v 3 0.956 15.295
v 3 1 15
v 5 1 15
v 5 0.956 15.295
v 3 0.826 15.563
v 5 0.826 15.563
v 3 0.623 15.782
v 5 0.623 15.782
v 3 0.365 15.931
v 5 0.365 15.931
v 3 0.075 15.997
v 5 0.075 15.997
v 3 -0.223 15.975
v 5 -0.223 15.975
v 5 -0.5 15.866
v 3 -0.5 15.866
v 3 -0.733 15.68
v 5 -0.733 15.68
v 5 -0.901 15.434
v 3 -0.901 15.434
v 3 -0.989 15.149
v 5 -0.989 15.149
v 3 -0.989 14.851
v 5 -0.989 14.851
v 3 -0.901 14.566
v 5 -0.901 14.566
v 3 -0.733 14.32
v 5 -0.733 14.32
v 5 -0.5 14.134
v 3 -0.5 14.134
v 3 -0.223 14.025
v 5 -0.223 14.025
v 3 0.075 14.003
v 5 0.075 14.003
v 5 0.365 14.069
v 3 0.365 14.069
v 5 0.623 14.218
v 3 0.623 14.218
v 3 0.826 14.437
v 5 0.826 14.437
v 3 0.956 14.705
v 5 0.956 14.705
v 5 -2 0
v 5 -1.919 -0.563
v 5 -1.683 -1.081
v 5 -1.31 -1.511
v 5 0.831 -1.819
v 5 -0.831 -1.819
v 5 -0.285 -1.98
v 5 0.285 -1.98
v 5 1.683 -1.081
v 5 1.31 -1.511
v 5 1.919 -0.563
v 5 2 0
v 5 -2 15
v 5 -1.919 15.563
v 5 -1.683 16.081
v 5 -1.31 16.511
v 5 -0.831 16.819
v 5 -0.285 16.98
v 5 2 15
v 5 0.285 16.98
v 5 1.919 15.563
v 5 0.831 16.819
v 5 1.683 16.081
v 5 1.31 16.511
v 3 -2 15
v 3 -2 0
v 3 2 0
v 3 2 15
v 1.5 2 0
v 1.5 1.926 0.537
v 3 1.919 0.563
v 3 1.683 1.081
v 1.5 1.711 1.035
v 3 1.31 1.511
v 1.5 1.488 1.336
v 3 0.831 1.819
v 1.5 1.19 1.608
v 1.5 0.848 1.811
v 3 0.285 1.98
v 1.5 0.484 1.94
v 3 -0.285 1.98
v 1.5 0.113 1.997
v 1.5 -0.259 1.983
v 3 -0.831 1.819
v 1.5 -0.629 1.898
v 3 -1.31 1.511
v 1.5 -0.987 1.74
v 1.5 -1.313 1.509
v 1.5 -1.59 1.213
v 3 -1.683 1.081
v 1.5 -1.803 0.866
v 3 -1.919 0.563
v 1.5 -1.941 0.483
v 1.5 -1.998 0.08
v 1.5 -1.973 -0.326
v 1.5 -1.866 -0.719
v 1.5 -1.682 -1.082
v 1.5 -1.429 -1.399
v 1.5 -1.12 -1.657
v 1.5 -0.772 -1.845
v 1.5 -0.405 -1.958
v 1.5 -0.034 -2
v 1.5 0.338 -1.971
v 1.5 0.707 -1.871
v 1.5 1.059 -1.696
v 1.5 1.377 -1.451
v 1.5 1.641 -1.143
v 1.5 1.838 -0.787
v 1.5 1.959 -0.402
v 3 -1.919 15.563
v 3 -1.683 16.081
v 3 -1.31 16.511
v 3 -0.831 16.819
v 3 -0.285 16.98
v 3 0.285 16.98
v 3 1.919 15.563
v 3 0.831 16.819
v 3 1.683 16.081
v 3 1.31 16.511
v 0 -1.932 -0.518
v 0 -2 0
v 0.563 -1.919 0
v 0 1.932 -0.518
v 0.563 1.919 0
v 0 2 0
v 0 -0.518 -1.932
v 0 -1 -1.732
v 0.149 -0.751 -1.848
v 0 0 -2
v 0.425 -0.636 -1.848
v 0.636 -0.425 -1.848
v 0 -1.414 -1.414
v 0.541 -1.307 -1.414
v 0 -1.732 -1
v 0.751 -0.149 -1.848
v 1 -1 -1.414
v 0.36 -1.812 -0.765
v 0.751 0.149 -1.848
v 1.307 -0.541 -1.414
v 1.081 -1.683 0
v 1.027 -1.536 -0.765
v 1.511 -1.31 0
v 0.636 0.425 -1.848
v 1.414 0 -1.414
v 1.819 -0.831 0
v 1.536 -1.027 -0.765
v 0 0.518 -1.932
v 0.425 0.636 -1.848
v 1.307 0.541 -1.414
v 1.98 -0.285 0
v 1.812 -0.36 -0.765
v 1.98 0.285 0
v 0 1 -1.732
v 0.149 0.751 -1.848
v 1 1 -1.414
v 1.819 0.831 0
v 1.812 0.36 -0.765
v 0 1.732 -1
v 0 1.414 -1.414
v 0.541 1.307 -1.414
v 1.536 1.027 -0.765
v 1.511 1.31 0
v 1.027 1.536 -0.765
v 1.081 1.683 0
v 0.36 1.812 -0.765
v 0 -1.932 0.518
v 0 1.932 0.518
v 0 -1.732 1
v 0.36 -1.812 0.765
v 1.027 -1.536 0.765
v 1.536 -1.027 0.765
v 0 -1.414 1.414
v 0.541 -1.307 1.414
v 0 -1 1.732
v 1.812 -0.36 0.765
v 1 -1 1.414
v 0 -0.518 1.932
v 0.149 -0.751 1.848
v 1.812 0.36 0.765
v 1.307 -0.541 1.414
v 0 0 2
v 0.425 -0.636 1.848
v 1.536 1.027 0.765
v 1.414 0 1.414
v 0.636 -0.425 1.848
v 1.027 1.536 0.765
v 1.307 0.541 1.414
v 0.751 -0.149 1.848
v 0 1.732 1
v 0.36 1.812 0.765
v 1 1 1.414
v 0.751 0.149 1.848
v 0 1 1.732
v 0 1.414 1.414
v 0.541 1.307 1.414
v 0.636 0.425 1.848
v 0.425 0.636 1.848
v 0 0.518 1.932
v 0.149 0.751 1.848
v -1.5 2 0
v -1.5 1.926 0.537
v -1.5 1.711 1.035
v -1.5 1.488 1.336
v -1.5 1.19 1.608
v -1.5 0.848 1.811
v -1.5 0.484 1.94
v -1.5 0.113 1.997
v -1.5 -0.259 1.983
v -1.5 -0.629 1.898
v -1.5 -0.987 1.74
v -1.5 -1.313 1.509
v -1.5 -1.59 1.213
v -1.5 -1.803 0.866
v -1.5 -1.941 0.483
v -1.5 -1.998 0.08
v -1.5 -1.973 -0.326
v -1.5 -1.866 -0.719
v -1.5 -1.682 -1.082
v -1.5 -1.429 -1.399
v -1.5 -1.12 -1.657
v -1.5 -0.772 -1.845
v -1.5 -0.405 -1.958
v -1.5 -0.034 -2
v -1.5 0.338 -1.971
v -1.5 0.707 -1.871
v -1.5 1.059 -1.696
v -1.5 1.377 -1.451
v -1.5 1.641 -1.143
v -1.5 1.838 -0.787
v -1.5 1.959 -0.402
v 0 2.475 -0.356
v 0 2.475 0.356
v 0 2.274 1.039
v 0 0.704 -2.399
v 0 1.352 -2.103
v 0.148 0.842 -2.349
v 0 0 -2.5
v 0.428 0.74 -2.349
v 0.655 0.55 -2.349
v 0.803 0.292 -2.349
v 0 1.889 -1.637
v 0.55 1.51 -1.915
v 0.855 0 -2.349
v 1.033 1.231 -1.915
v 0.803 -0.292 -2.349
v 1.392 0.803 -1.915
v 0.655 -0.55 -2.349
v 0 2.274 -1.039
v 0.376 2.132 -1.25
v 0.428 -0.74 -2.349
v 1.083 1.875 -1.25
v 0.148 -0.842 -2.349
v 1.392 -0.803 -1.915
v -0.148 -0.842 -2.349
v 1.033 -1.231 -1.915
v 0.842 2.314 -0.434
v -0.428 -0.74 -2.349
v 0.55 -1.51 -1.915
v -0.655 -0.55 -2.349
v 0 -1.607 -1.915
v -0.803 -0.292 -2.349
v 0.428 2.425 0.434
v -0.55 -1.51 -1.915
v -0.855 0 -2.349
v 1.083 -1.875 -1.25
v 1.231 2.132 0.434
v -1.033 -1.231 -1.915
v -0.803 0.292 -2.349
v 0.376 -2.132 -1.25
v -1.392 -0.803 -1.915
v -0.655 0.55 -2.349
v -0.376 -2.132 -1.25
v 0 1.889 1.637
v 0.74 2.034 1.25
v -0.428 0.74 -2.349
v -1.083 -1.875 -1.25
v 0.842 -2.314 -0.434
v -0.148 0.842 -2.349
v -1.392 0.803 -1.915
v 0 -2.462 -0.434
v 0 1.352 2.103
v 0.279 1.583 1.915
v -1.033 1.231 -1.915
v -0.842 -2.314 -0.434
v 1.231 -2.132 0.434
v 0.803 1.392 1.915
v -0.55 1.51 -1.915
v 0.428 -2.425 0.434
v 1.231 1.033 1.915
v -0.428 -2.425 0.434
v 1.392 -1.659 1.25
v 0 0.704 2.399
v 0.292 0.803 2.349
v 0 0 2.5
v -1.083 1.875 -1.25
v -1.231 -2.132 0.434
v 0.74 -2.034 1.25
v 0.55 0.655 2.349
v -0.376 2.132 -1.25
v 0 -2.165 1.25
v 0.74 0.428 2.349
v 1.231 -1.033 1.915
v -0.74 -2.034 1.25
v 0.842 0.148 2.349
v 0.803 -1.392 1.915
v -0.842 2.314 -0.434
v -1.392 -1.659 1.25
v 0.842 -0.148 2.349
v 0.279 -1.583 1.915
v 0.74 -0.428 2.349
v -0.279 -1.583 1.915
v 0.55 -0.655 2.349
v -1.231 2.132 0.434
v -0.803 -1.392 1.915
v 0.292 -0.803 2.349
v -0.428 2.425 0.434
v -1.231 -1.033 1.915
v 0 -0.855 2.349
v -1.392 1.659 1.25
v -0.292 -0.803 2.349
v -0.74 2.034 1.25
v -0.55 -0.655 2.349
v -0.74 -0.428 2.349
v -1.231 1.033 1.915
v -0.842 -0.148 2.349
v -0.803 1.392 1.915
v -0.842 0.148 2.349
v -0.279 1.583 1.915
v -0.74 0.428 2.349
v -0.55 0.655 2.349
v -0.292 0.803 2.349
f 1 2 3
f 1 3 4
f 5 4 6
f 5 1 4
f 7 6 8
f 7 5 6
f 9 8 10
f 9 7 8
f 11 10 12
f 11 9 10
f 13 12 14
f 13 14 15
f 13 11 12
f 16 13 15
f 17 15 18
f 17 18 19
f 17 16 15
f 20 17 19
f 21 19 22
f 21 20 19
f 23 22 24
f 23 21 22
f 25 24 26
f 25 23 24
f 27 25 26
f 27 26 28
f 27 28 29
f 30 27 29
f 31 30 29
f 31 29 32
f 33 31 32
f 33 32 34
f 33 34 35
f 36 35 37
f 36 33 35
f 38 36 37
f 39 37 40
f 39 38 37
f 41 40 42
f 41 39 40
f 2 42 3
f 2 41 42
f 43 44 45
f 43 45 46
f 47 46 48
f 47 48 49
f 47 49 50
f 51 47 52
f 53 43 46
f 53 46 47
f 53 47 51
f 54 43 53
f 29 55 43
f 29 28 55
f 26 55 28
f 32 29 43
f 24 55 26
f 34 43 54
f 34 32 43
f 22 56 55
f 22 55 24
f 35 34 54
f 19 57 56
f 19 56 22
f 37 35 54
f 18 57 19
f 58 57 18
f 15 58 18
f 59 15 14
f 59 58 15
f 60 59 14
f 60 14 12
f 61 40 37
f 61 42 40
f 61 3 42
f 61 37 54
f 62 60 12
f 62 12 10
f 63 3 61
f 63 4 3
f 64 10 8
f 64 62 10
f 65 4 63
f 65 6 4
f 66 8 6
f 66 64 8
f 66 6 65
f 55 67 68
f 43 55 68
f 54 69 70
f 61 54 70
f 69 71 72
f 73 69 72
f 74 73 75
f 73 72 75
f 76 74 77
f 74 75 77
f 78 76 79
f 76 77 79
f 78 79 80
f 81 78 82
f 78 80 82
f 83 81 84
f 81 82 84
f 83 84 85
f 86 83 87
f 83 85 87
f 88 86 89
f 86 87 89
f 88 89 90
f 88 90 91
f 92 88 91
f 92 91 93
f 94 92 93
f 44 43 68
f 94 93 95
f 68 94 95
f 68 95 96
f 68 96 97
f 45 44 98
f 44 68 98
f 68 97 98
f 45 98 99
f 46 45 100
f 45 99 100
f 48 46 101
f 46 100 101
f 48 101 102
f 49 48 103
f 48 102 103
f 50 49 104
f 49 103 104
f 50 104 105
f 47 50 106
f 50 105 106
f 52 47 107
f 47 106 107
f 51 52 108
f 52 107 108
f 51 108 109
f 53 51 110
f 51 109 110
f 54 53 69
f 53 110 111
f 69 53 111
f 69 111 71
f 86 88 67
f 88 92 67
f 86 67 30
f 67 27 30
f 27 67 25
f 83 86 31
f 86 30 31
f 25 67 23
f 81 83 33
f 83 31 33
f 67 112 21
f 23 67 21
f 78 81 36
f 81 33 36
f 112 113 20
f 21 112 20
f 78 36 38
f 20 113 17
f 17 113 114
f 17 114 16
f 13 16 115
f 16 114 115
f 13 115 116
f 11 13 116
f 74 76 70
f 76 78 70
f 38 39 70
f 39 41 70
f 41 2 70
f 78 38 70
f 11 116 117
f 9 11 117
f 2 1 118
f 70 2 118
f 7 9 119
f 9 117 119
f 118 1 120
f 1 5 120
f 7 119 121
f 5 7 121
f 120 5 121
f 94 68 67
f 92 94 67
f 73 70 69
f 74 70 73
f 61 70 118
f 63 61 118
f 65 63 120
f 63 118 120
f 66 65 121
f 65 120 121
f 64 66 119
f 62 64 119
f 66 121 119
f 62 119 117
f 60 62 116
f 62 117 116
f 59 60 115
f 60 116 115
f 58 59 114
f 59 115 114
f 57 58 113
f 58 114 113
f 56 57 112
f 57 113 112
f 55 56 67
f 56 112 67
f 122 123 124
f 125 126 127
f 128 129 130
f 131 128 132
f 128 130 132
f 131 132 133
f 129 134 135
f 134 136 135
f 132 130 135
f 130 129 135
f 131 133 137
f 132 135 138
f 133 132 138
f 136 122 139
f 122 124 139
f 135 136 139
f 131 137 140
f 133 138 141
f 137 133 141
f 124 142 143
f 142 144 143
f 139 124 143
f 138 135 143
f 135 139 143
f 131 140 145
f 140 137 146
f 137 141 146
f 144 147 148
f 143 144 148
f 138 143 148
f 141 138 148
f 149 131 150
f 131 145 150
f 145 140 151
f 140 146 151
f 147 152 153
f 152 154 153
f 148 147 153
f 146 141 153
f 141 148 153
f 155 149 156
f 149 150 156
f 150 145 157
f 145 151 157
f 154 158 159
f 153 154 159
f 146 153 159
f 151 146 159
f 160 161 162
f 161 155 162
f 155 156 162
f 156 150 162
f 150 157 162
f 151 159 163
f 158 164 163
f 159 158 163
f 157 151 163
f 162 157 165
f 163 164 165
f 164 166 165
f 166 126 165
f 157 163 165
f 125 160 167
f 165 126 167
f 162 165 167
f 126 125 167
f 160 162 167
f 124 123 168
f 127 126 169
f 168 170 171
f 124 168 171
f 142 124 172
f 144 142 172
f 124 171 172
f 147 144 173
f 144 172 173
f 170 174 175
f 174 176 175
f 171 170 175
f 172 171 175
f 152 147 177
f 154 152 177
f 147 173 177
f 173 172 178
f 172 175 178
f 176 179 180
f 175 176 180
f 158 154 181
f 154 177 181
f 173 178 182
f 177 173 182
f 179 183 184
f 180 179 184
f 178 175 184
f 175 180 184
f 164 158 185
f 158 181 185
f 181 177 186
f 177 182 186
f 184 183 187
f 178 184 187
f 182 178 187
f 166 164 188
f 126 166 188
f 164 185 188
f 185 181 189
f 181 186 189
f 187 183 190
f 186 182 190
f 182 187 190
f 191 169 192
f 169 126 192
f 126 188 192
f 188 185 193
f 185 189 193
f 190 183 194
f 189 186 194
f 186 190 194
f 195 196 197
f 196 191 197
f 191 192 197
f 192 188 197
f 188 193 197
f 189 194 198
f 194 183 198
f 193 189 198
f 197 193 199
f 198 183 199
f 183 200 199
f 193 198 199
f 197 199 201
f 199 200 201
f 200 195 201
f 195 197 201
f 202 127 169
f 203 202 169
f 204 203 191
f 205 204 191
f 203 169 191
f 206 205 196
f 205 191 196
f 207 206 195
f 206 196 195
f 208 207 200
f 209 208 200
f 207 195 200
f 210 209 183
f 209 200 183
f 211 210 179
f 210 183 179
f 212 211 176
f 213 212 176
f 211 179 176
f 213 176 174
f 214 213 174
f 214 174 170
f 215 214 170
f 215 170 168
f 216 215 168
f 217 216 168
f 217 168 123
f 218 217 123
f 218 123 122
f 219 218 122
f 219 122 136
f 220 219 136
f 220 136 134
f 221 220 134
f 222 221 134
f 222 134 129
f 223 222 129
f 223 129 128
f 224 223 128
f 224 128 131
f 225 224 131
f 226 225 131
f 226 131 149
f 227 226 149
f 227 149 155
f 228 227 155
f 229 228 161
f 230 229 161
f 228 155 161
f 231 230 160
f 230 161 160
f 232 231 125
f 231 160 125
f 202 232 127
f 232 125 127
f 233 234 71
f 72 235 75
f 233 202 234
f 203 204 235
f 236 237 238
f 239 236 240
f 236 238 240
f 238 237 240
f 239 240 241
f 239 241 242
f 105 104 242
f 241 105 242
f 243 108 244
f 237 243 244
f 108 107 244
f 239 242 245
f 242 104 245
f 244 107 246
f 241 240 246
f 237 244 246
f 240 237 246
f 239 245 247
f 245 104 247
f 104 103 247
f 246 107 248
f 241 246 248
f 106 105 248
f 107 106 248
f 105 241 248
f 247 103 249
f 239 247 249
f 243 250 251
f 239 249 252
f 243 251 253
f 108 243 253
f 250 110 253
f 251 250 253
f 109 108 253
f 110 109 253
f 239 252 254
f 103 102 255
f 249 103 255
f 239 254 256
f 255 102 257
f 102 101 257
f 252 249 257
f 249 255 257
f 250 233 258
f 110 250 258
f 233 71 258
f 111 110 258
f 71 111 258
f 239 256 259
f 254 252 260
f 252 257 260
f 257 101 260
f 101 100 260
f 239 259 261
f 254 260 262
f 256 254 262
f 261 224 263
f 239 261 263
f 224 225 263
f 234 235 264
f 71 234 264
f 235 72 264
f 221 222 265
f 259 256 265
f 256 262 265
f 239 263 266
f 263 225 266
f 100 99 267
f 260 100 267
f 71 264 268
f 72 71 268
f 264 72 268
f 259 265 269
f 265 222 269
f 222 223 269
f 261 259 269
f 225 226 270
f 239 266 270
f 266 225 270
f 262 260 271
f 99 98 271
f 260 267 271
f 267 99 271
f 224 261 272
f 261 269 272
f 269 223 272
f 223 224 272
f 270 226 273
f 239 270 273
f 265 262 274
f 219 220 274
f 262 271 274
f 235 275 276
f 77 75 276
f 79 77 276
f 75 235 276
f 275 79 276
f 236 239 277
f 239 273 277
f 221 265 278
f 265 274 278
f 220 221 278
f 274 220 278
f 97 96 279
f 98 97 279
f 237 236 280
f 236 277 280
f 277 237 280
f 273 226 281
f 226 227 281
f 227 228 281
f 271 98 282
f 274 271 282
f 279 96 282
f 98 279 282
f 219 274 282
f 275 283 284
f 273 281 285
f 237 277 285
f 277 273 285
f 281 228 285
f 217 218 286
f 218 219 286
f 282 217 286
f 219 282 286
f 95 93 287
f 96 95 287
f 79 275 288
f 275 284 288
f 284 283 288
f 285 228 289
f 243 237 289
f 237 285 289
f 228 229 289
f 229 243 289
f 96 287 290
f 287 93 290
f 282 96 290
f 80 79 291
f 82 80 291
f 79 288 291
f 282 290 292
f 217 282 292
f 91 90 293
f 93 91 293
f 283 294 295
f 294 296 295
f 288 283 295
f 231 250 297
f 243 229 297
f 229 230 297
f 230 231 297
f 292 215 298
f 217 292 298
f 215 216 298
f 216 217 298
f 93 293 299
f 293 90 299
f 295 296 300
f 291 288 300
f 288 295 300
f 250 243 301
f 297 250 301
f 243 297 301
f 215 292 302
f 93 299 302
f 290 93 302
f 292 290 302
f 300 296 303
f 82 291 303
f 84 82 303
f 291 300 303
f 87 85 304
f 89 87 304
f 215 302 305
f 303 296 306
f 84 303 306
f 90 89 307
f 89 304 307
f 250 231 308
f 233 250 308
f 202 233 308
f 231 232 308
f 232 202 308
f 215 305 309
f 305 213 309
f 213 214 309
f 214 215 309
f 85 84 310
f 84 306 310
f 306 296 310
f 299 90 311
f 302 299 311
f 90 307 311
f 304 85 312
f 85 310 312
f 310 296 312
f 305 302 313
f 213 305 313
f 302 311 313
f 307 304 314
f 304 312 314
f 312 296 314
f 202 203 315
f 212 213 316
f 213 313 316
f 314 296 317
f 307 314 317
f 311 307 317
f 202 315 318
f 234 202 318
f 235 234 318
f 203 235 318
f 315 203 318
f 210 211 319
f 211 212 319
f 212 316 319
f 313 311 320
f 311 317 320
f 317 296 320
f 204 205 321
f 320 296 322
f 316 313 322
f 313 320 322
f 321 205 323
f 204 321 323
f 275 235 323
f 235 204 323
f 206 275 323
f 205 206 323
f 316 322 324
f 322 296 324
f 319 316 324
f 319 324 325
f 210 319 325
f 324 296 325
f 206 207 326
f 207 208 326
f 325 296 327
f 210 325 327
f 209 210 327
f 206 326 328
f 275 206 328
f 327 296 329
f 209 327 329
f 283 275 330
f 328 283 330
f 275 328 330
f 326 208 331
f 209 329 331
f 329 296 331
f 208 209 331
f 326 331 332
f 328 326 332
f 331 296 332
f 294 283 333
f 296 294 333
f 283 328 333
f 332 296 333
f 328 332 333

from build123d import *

# Parameters (mm, degrees)
F2_R     = 2
F3_DEPTH = 2.5
F4_R     = 2
F5_DEPTH = 3
F6_R     = 1
F7_DEPTH = 2


with BuildPart() as f1:
    # F0 (on Right) → F1 (revolve)
    with BuildSketch(Plane.YZ):
        with BuildLine():
            ThreePointArc((0, -2.5), (2.5, 0), (0, 2.5))
            Line((0, 2.5), (0, 2))
            ThreePointArc((0, 2), (2, 0), (0, -2))
            Line((0, -2), (0, -2.5))
        make_face()
    revolve(axis=Axis((0, 0, 0), (0, 0, -1)))

    # F2 (on Right) → F3 (cut)
    with BuildSketch(Plane.YZ):
        Circle(F2_R)
    extrude(amount=-F3_DEPTH, mode=Mode.SUBTRACT)

    # F4 (on Right) → F5 (join)
    with BuildSketch(Plane.YZ):
        Circle(F4_R)
    extrude(amount=F5_DEPTH)

    # F6 (on face) → F7 (join)
    with BuildSketch(Plane.YZ.offset(3)):
        with BuildLine():
            ThreePointArc((-2, 0), (0, -2), (2, 0))
            ThreePointArc((2, 0), (0, 2), (-2, 0))
        make_face()
        with BuildLine():
            ThreePointArc((-2, 0), (0, 2), (2, 0))
            Line((2, 0), (2, 15))
            ThreePointArc((2, 15), (0, 13), (-2, 15))
            Line((-2, 15), (-2, 0))
        make_face()
        with BuildLine():
            ThreePointArc((-2, 15), (0, 13), (2, 15))
            ThreePointArc((2, 15), (0, 17), (-2, 15))
        make_face()
        with Locations((0, 15)):
            Circle(F6_R, mode=Mode.SUBTRACT)
    extrude(amount=F7_DEPTH)

    # F8 (on face) → F9 (revolve, cut)
    with BuildSketch(Plane(origin=(0, 0, 0), x_dir=(0, -1, 0), z_dir=(-1, 0, 0))):
        with BuildLine():
            Line((0, 2), (0, -2))
            ThreePointArc((0, -2), (1.4142135624, -1.4142135624), (2, 0))
            ThreePointArc((2, 0), (1.4142135624, 1.4142135624), (0, 2))
        make_face()
    revolve(axis=Axis((0, 0, 0), (0, 0, 1)), mode=Mode.SUBTRACT)


solid = f1.part
